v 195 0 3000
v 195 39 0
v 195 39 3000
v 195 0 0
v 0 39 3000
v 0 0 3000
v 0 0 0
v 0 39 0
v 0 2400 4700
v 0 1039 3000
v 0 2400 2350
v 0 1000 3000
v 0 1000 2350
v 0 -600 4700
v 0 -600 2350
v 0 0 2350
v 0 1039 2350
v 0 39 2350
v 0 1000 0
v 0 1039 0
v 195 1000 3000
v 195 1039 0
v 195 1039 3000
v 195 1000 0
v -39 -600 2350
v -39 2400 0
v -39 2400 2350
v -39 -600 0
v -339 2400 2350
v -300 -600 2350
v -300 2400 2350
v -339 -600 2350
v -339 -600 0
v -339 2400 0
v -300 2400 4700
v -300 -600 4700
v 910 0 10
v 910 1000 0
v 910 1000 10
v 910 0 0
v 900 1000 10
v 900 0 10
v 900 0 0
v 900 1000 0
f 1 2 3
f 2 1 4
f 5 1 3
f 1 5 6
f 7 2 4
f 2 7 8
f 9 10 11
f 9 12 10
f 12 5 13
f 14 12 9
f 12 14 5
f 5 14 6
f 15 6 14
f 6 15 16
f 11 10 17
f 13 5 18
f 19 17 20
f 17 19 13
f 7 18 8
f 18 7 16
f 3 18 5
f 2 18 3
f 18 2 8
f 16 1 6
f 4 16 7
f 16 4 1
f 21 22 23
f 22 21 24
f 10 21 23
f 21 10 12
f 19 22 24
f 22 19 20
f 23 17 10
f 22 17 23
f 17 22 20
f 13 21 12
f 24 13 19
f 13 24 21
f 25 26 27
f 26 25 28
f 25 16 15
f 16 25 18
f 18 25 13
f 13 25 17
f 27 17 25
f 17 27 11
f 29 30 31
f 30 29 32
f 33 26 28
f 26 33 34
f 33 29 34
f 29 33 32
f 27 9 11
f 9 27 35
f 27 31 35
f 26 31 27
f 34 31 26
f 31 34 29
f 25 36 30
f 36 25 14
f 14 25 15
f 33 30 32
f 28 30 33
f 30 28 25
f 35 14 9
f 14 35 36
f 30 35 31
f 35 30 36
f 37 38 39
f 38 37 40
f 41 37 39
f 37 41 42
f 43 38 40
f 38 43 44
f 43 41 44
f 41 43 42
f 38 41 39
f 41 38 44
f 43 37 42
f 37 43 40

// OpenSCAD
//TreppeWerkstatt

/*
235
hoehe links wand
300
brett länge
39 40
dicke brett
19.5
breite brett
90
brett vorne zu wand (wie leiter) eher kleiner
35 39
Holzwand
*/

module Brett()
{
    color("#aa5500")
    cube([195,39,3000]);
}

Brett();

translate([0,1000,0])
Brett();

module Wand()
{
    translate([-339,-600,0])
    color("#ffda82")
    cube([300,3000,2350]);
}

Wand();

module Holzwand()
{
    translate([-300,-600,2350])
    color("#4c2600")
    cube([300,3000,2350]);
}

Holzwand();

module MaximalLinie()
{
    translate([900,0,0])
    color("#0055ff")
    cube([10,1000,10]);
}

MaximalLinie();
